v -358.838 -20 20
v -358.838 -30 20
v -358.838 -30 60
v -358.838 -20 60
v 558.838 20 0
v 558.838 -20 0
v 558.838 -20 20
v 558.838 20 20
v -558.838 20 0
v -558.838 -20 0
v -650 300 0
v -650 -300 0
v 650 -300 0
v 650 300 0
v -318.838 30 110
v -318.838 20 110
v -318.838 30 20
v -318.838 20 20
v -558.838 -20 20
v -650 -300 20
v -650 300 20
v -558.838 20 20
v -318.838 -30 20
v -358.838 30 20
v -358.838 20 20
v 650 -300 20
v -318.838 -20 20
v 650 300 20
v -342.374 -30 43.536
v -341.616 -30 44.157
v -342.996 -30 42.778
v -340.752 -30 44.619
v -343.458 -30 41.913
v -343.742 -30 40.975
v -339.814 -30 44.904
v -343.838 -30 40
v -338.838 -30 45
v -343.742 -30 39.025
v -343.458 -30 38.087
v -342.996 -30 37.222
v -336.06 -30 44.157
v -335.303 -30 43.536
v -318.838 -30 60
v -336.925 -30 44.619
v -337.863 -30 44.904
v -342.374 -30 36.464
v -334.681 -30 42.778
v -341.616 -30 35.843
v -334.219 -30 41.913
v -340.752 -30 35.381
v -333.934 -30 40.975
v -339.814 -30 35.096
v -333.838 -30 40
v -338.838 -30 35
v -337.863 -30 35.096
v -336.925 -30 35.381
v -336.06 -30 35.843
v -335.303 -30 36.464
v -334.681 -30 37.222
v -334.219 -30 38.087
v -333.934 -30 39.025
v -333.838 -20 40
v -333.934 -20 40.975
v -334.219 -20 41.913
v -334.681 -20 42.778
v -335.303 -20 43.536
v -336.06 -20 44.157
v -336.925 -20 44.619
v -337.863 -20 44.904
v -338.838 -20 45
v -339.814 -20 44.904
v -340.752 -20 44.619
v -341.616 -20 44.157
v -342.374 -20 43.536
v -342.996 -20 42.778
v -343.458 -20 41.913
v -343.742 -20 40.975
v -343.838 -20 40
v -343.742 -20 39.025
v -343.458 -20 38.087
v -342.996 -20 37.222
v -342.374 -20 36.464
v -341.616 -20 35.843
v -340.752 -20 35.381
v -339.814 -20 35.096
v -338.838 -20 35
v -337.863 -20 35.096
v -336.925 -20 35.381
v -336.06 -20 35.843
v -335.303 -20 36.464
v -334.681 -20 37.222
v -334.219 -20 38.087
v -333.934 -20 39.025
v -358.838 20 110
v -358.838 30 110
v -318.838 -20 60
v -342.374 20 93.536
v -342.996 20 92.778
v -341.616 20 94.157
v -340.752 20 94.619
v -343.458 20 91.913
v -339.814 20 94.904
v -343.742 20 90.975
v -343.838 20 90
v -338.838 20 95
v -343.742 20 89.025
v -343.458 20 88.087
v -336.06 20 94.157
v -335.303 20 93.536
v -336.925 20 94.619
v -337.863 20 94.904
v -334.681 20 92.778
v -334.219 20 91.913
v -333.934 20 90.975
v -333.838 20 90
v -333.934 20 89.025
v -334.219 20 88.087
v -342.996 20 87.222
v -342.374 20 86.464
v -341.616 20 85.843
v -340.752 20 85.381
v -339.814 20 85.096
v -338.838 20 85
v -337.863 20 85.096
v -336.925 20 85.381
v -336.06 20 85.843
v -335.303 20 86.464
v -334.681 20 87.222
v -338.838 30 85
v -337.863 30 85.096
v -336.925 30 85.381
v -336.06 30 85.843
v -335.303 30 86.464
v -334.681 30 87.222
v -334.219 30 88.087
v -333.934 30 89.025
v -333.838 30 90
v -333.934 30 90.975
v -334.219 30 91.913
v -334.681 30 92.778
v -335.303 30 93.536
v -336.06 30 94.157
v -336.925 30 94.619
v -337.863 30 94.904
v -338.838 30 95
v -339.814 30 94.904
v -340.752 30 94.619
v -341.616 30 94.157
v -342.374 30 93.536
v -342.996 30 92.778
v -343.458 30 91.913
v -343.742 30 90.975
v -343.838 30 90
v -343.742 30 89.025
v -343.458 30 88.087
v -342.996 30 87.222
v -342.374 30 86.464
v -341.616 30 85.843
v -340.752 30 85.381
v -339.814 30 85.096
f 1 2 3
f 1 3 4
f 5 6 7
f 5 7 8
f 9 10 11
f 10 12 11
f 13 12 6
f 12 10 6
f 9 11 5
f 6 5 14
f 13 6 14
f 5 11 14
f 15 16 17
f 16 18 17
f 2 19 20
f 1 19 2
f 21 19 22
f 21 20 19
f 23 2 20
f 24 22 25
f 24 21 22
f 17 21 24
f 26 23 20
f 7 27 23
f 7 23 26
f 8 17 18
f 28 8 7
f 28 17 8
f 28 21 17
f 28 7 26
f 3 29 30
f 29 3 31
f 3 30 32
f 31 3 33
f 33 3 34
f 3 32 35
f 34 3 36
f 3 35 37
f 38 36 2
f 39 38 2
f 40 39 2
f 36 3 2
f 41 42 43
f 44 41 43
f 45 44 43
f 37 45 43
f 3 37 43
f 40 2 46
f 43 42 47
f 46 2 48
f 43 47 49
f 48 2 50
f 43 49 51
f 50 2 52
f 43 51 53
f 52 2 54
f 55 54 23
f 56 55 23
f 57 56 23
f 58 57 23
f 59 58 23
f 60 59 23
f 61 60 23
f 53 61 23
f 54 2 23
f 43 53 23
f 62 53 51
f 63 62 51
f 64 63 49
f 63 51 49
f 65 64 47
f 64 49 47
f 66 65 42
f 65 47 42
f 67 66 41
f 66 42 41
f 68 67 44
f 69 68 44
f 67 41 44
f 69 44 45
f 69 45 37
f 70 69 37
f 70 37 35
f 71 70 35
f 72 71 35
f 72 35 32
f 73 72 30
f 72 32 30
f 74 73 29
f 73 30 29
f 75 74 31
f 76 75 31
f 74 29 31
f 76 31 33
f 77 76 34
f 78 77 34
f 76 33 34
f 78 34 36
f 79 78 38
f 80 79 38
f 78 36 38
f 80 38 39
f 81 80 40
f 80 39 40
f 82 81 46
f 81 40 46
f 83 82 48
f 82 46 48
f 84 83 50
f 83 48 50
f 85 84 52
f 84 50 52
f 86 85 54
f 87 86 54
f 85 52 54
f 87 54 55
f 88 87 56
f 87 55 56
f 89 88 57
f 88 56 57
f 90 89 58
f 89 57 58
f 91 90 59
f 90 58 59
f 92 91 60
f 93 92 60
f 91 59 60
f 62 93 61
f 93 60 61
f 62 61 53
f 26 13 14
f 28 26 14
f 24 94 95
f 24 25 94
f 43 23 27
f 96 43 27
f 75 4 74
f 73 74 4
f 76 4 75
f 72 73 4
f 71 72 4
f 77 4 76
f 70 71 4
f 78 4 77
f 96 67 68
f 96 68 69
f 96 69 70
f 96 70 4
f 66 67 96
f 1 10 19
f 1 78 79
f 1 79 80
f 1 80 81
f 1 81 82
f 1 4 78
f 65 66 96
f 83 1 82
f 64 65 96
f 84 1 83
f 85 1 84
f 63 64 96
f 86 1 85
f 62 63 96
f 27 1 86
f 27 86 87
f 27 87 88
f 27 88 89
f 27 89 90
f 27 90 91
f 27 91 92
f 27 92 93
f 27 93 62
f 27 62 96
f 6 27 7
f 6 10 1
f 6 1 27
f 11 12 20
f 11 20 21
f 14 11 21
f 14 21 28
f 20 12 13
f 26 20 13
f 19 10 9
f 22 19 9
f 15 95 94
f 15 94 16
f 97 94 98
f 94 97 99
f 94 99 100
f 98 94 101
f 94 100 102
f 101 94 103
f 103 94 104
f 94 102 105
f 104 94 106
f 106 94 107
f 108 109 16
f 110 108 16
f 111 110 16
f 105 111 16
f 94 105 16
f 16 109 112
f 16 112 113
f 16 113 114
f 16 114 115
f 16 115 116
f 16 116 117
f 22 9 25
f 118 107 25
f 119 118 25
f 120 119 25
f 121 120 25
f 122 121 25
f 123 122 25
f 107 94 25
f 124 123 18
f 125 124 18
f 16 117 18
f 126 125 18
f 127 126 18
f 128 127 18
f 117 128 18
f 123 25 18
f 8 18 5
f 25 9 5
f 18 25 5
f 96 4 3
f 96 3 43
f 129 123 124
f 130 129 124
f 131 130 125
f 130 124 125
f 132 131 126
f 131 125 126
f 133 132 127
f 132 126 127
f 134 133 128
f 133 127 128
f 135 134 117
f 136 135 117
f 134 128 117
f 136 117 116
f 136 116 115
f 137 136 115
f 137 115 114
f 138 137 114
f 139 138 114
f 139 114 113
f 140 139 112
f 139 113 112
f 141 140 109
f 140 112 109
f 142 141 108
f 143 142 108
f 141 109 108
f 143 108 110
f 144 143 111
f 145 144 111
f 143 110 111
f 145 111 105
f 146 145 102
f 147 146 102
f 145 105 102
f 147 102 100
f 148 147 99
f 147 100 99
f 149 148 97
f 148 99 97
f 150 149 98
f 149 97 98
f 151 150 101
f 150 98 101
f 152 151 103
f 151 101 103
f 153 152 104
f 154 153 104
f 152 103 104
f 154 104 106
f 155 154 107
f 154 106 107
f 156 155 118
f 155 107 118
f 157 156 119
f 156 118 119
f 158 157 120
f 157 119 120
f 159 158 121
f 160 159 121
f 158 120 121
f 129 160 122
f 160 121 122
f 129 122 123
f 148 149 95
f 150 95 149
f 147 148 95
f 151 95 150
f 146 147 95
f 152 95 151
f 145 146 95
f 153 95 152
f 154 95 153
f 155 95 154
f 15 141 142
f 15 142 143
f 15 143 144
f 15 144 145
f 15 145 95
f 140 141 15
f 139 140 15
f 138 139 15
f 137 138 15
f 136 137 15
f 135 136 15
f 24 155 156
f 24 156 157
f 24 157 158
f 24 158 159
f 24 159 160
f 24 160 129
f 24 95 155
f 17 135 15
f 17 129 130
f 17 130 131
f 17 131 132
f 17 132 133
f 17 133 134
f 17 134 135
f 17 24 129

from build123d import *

# Parameters (mm, degrees)
SKETCH1_W           = 1300
SKETCH1_H           = 600
SKETCH1_W_2         = 1117.676372874
SKETCH1_H_2         = 40
BOSS_EXTRUDE1_DEPTH = 20
SKETCH2_W           = 40
SKETCH2_H           = 10
BOSS_EXTRUDE2_DEPTH = 40
SKETCH3_R           = 5
CUT_EXTRUDE1_DEPTH  = 10
SKETCH4_W           = 40
SKETCH4_H           = 10
BOSS_EXTRUDE3_DEPTH = 50
SKETCH5_R           = 5
CUT_EXTRUDE2_DEPTH  = 10


with BuildPart() as part:
    # Sketch1 → Boss-Extrude1 (new body)
    with BuildSketch(Plane.XY):
        Rectangle(SKETCH1_W, SKETCH1_H)
        Rectangle(SKETCH1_W_2, SKETCH1_H_2, mode=Mode.SUBTRACT)
    extrude(amount=BOSS_EXTRUDE1_DEPTH)

    # Sketch2 → Boss-Extrude2 (add)
    with BuildSketch(Plane.XY.offset(20)):
        with Locations((-338.838186437, 25)):
            Rectangle(SKETCH2_W, SKETCH2_H)
        with Locations((-338.838186437, -25)):
            Rectangle(SKETCH2_W, SKETCH2_H)
    extrude(amount=BOSS_EXTRUDE2_DEPTH)

    # Sketch3 → Cut-Extrude1 (cut)
    with BuildSketch(Plane.XZ.offset(30)):
        with Locations((-338.838186437, 40)):
            Circle(SKETCH3_R)
    extrude(amount=-CUT_EXTRUDE1_DEPTH, mode=Mode.SUBTRACT)

    # Sketch4 → Boss-Extrude3 (add)
    with BuildSketch(Plane.XY.offset(60)):
        with Locations((-338.838186437, 25)):
            Rectangle(SKETCH4_W, SKETCH4_H)
    extrude(amount=BOSS_EXTRUDE3_DEPTH)

    # Sketch5 → Cut-Extrude2 (cut)
    with BuildSketch(Plane.XZ.offset(-20)):
        with Locations(Location((-338.838186437, 90, 0), (0, 0, 270))):
            Circle(SKETCH5_R)
    extrude(amount=-CUT_EXTRUDE2_DEPTH, mode=Mode.SUBTRACT)


solid = part.part
